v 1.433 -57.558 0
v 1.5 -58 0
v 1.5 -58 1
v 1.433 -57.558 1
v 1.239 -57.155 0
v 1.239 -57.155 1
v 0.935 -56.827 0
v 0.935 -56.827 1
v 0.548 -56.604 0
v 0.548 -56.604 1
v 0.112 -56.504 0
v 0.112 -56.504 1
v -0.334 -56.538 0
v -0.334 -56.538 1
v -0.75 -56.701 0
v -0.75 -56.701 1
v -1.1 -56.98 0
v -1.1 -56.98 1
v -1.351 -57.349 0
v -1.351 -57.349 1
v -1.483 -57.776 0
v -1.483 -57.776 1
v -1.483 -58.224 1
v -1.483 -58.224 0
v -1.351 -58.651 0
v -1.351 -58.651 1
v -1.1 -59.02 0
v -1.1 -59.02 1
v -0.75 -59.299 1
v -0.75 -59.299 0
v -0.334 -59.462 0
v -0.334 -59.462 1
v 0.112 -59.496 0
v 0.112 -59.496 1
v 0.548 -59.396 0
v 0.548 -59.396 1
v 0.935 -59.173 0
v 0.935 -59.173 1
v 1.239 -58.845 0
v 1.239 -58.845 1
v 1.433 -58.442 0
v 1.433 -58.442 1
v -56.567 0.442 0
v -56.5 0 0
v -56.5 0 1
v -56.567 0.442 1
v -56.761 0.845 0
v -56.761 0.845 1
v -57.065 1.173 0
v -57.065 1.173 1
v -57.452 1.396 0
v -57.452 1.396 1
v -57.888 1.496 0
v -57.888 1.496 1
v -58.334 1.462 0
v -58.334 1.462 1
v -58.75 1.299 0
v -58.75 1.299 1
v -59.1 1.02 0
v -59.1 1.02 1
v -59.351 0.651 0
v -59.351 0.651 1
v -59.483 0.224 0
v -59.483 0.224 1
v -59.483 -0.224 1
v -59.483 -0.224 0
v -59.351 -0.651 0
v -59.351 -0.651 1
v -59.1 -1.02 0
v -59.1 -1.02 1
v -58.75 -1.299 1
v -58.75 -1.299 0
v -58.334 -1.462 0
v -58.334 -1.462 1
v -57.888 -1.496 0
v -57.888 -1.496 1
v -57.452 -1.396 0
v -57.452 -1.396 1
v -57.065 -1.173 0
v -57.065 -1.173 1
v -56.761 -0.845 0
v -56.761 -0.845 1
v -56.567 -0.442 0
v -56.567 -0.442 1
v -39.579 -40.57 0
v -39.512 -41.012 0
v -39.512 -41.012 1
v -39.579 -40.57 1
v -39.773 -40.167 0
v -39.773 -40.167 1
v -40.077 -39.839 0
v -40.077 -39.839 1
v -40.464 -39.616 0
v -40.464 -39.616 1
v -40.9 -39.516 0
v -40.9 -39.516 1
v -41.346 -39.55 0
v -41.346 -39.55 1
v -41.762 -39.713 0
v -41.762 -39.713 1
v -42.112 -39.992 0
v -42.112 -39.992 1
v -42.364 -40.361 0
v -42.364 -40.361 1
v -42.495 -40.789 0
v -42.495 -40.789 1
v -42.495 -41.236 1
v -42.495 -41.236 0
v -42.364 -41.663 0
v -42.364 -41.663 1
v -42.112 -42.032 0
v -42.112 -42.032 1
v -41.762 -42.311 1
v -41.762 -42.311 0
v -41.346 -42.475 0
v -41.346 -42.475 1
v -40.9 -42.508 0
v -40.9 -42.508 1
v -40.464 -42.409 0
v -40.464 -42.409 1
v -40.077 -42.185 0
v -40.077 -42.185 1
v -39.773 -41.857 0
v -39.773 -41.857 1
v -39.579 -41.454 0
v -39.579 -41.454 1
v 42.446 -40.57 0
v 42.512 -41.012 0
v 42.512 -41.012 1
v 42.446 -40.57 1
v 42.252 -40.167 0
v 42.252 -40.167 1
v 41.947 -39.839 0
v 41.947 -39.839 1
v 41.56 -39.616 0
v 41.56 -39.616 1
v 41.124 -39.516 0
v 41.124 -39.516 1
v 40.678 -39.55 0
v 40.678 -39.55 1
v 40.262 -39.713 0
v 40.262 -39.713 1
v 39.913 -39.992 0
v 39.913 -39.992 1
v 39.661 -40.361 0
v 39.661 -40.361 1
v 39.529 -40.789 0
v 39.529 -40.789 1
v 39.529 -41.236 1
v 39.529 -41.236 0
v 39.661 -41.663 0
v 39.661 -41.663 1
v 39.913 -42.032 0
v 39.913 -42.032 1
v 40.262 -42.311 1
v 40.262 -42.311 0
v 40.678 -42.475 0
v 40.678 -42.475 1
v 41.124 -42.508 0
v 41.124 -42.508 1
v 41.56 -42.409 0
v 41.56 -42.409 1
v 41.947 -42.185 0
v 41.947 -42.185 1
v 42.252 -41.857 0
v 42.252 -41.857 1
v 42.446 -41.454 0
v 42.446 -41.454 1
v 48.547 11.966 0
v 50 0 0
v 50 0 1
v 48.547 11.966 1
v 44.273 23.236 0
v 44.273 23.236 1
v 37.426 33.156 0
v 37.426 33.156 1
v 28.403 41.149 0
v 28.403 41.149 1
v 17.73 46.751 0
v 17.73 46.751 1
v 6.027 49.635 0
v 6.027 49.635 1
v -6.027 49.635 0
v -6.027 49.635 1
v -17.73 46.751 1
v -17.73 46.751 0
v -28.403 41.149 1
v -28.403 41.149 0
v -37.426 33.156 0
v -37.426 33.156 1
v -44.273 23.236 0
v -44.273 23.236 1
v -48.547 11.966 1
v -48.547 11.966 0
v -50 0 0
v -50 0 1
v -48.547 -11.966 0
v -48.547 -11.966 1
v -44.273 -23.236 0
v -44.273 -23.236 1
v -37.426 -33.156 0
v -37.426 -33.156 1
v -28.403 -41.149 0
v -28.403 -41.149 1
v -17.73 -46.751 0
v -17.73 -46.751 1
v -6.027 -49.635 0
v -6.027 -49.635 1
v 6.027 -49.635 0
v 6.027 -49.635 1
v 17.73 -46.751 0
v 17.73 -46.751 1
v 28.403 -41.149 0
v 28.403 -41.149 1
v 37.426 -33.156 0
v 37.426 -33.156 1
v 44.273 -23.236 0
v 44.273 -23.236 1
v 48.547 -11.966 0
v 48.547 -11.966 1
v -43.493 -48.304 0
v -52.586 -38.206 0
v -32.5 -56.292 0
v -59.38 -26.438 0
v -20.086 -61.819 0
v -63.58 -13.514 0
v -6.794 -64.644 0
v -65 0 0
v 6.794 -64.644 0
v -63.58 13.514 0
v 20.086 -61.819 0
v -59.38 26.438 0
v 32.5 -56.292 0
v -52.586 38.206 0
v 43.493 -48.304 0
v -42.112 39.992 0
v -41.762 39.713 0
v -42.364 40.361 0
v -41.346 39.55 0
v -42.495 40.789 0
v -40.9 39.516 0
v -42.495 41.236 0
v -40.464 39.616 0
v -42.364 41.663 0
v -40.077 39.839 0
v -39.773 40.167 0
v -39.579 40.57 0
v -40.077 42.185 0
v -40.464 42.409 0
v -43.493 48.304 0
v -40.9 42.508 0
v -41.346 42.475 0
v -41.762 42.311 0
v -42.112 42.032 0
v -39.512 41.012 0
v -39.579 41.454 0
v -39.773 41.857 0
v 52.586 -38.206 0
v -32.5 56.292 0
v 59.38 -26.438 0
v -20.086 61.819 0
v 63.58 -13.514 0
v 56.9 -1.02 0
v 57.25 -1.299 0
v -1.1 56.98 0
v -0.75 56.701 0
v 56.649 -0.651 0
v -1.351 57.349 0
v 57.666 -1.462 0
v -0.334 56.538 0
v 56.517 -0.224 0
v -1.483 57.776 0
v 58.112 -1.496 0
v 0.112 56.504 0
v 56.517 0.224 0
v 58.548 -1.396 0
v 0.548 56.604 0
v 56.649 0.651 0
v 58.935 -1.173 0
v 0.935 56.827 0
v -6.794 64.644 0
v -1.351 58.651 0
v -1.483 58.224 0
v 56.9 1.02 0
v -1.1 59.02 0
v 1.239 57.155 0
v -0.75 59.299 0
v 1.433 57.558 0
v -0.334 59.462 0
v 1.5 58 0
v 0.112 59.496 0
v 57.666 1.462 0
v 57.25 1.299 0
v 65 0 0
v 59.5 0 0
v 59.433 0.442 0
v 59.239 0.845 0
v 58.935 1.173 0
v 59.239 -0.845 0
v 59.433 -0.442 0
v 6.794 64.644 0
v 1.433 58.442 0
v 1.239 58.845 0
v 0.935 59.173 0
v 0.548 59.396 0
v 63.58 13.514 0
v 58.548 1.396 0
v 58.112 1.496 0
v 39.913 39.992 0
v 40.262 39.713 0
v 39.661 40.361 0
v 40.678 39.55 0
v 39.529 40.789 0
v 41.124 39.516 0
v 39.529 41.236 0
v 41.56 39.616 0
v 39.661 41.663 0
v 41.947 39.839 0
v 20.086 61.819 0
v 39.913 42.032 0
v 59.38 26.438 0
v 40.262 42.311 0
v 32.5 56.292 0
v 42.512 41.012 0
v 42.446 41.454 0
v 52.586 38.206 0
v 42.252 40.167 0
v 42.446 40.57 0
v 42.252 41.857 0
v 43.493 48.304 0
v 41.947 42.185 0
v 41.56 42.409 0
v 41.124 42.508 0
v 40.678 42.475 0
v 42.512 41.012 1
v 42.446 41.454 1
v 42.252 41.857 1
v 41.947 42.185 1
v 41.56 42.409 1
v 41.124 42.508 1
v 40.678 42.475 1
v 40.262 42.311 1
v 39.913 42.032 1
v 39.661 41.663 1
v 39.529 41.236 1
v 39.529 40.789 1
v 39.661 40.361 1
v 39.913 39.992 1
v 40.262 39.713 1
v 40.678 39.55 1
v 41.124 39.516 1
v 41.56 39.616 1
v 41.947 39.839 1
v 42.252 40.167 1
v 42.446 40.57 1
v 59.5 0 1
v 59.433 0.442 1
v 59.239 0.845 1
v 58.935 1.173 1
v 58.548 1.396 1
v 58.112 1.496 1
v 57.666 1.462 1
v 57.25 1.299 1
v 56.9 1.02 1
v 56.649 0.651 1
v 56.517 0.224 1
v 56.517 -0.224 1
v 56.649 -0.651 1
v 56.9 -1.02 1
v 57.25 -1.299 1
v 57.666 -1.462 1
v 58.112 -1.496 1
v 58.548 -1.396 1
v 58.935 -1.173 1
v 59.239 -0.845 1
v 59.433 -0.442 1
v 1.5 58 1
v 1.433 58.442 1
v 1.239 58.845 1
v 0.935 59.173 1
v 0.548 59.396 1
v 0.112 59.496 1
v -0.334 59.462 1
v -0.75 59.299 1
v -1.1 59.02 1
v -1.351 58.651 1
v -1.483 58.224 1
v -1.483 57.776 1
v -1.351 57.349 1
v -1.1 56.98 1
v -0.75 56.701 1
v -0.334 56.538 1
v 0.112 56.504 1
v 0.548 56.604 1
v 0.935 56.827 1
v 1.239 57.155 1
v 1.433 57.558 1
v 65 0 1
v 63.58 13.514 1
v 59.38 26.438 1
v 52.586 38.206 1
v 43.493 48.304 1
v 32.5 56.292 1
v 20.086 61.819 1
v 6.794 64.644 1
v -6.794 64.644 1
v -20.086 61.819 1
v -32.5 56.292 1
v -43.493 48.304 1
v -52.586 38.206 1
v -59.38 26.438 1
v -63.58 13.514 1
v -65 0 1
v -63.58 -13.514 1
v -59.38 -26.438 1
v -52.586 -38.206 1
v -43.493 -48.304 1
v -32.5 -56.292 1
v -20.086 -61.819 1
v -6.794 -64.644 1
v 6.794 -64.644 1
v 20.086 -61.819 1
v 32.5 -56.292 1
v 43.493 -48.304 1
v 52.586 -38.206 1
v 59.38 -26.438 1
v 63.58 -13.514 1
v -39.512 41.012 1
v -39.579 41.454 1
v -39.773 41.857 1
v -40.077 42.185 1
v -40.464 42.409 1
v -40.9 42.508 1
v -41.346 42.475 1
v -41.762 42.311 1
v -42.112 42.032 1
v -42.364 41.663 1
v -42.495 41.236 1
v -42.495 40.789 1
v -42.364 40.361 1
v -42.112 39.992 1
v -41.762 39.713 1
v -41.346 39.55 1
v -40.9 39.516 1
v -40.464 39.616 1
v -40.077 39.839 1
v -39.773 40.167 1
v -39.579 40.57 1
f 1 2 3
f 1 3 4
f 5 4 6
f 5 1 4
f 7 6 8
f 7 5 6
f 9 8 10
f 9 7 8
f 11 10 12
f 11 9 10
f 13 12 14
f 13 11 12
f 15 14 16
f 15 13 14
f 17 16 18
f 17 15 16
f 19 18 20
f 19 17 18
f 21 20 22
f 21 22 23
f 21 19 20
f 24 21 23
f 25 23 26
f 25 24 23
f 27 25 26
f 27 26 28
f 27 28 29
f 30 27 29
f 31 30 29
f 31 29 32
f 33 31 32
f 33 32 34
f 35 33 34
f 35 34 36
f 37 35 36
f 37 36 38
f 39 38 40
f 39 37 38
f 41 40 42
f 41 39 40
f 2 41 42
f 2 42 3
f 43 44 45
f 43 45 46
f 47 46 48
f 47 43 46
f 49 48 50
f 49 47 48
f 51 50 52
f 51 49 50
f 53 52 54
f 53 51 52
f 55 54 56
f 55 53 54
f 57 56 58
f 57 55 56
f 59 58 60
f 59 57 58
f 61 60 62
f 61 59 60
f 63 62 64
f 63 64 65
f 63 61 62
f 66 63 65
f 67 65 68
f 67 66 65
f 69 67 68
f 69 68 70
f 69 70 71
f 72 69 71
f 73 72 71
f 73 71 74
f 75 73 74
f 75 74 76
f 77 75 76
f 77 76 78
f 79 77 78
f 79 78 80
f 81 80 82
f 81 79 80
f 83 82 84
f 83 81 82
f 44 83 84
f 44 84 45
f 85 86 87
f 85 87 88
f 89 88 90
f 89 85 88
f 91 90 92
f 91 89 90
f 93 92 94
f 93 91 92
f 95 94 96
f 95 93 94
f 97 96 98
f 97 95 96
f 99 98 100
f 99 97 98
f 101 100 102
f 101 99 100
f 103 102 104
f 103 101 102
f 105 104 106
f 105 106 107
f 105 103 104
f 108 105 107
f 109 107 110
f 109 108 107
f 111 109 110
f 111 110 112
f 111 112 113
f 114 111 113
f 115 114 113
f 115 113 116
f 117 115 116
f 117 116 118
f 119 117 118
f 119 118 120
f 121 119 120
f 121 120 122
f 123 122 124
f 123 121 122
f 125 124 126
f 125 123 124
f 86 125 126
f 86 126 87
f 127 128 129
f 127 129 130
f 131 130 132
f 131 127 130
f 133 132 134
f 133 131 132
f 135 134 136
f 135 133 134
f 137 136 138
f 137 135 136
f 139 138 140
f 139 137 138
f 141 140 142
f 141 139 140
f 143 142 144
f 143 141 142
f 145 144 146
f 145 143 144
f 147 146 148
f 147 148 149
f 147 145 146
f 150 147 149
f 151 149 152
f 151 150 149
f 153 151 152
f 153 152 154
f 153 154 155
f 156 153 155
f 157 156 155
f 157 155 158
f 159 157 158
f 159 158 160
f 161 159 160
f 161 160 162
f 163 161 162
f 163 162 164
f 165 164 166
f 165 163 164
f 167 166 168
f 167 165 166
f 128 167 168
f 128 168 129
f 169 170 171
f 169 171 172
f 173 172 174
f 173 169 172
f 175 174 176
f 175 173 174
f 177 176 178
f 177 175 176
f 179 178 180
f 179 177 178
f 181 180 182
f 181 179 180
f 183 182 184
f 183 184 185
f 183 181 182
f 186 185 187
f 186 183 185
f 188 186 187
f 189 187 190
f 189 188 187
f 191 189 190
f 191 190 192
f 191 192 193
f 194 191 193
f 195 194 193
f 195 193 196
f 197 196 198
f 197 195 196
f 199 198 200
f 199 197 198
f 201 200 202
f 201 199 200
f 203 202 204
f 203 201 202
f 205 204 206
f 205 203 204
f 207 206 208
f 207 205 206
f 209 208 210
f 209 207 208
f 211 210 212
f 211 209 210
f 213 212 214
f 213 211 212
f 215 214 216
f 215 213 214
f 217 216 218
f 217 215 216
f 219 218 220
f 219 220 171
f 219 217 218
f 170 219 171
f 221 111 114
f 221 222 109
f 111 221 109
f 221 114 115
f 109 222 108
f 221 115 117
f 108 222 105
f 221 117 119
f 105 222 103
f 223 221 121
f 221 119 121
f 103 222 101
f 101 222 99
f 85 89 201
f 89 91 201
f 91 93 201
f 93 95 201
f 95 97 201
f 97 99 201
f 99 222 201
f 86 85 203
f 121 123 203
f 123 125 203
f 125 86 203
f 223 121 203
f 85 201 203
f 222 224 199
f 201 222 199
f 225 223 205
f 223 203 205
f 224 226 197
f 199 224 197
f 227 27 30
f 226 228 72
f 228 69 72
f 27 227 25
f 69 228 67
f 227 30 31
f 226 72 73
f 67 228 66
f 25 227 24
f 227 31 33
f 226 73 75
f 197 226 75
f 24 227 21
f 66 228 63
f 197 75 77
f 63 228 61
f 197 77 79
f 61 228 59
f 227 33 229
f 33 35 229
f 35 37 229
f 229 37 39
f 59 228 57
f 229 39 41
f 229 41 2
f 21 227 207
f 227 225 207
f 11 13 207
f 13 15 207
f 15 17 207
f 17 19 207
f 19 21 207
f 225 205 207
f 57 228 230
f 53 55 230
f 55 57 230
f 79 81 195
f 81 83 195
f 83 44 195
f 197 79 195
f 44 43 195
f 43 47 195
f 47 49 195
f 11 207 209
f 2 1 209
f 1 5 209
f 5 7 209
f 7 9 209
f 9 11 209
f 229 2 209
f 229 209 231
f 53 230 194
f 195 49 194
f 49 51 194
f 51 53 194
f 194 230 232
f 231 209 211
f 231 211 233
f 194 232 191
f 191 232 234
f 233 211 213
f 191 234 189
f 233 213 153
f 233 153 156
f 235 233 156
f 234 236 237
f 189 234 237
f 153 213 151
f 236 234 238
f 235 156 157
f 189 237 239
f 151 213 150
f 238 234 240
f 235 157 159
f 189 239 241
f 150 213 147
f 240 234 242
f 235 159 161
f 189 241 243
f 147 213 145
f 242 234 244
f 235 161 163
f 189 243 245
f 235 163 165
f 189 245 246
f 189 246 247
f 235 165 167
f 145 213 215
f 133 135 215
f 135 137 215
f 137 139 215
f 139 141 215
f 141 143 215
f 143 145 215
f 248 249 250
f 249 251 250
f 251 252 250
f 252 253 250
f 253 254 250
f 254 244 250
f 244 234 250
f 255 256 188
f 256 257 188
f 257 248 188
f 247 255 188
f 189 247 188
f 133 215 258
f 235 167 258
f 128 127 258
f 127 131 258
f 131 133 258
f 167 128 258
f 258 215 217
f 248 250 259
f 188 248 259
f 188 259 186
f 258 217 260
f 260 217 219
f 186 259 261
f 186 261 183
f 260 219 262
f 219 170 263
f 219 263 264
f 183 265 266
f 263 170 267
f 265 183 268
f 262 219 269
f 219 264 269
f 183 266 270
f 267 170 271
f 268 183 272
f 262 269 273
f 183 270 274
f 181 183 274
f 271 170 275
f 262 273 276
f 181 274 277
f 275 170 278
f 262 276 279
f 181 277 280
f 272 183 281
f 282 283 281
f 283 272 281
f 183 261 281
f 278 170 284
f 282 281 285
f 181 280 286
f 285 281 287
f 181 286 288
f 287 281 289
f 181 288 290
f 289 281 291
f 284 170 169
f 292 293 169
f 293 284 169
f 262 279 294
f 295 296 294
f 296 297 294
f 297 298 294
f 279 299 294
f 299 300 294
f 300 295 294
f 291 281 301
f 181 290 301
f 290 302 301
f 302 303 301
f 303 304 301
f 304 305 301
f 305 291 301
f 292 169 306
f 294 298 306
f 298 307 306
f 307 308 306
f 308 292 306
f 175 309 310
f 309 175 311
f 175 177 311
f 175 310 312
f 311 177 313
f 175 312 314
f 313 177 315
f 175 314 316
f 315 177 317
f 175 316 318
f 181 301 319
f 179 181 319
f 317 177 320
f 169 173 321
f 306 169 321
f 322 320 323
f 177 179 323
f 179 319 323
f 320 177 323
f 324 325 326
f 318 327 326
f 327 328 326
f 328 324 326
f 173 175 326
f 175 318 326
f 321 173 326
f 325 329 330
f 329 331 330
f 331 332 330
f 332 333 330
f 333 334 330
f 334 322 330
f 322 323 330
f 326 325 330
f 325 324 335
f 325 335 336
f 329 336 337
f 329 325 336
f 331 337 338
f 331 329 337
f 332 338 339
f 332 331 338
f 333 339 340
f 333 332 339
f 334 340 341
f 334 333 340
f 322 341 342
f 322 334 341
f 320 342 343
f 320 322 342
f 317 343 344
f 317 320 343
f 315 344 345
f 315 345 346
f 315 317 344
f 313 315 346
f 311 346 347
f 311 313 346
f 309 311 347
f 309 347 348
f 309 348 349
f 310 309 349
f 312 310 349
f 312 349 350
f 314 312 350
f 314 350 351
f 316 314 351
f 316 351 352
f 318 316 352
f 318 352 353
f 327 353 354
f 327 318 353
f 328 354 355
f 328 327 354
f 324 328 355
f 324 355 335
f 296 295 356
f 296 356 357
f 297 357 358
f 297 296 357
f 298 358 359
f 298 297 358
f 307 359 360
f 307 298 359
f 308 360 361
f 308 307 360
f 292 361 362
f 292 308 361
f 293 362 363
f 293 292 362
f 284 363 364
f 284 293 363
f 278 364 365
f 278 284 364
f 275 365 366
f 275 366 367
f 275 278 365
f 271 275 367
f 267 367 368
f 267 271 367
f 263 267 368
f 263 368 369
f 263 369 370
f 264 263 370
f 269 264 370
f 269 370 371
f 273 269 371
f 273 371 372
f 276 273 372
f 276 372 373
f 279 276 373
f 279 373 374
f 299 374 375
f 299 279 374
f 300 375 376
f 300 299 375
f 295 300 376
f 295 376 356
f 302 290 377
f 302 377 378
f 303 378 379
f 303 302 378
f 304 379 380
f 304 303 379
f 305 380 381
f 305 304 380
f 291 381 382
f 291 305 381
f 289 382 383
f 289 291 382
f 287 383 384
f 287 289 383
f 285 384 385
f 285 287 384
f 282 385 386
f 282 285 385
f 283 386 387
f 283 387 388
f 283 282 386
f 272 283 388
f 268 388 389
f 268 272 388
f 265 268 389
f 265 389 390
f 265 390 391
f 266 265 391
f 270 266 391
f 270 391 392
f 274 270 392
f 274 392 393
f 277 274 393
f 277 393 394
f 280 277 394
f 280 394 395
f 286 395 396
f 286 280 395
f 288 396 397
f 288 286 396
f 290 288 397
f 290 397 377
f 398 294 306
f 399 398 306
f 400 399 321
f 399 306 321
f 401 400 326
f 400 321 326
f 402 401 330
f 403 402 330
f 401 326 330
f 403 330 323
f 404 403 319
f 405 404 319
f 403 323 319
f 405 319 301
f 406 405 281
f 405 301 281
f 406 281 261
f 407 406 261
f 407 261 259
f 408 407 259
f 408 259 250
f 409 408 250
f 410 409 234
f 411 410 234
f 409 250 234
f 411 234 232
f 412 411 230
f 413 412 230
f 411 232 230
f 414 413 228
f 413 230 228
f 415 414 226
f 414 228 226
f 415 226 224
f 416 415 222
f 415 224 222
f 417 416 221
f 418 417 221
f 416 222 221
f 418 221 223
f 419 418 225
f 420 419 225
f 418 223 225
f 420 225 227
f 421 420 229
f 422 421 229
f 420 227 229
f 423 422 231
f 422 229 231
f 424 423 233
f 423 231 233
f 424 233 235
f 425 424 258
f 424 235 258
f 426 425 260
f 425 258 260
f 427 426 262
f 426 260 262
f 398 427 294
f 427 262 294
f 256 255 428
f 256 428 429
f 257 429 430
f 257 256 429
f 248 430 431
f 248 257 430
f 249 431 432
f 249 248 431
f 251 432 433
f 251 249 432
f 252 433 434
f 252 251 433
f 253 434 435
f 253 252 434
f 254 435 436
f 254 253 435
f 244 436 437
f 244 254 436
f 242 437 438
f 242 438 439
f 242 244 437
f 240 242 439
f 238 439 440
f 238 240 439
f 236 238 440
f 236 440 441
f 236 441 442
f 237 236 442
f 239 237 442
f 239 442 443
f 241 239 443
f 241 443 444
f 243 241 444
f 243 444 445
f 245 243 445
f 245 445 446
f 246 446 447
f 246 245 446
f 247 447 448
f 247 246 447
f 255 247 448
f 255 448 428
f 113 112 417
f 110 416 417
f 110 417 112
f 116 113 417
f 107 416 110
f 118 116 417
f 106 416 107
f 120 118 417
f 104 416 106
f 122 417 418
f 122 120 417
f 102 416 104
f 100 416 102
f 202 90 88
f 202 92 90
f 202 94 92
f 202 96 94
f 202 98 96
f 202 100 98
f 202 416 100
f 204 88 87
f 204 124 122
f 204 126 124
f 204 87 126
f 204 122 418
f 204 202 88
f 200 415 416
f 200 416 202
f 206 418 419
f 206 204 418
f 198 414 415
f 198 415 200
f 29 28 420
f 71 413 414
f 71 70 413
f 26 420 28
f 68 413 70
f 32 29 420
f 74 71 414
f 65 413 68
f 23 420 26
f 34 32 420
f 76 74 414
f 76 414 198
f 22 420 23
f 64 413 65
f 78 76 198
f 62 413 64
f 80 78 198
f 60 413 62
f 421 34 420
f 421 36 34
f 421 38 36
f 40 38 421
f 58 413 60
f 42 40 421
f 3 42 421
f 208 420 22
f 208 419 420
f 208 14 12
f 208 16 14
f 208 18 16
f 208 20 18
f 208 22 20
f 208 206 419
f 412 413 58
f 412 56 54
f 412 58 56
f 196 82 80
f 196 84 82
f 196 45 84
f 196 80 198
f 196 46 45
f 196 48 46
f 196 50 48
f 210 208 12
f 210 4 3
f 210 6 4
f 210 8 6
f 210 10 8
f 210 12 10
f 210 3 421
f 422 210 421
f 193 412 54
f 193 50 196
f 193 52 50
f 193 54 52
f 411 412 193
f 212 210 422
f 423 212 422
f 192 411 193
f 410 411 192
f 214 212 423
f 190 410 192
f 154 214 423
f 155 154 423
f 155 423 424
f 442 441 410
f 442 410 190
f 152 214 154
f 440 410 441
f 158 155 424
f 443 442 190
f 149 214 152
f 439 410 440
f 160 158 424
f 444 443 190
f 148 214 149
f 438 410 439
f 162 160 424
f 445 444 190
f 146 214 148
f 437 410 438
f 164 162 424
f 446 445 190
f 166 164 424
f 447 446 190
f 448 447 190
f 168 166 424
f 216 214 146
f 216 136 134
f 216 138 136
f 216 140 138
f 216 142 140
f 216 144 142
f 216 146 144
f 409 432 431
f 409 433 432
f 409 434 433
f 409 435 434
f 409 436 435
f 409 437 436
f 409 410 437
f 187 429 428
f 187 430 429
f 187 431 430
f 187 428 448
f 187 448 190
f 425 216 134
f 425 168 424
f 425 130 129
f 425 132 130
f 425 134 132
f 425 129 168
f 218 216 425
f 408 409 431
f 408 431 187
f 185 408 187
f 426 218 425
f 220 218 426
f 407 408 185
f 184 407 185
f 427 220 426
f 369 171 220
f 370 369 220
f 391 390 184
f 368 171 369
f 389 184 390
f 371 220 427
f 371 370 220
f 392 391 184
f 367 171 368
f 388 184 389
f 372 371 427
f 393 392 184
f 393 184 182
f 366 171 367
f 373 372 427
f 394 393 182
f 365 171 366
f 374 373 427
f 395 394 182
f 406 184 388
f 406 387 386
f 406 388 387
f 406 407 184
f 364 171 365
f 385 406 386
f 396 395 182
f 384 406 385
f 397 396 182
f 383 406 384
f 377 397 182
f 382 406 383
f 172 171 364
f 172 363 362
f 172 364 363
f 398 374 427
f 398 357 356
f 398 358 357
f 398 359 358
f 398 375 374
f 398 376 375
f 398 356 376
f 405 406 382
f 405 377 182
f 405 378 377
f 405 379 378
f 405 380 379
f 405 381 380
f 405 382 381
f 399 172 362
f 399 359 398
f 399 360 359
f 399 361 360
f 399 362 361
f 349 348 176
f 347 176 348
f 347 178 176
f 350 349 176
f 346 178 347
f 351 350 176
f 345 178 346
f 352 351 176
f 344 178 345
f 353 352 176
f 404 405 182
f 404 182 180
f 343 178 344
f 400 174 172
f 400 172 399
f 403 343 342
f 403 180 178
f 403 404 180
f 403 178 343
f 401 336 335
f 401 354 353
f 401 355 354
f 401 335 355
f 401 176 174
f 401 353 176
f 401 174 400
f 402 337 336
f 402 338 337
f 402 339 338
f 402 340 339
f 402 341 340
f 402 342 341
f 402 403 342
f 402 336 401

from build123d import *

# Parameters (mm, degrees)
SKETCH_R      = 65
SKETCH_R_2    = 50
SKETCH_R_3    = 1.5
EXTRUDE_DEPTH = 1


with BuildPart() as part:
    # Sketch → Extrude (new body)
    with BuildSketch(Plane.XY):
        Circle(SKETCH_R)
        Circle(SKETCH_R_2, mode=Mode.SUBTRACT)
        with Locations((-41.012193, 41.012193)):
            Circle(SKETCH_R_3, mode=Mode.SUBTRACT)
        with Locations((0, 58)):
            Circle(SKETCH_R_3, mode=Mode.SUBTRACT)
        with Locations((58, 0)):
            Circle(SKETCH_R_3, mode=Mode.SUBTRACT)
        with Locations((0, -58)):
            Circle(SKETCH_R_3, mode=Mode.SUBTRACT)
        with Locations((-41.012193, -41.012193)):
            Circle(SKETCH_R_3, mode=Mode.SUBTRACT)
        with Locations((-58, 0)):
            Circle(SKETCH_R_3, mode=Mode.SUBTRACT)
        with Locations((41.012193, -41.012193)):
            Circle(SKETCH_R_3, mode=Mode.SUBTRACT)
        with Locations((41.012193, 41.012193)):
            Circle(SKETCH_R_3, mode=Mode.SUBTRACT)
    extrude(amount=EXTRUDE_DEPTH)


solid = part.part
